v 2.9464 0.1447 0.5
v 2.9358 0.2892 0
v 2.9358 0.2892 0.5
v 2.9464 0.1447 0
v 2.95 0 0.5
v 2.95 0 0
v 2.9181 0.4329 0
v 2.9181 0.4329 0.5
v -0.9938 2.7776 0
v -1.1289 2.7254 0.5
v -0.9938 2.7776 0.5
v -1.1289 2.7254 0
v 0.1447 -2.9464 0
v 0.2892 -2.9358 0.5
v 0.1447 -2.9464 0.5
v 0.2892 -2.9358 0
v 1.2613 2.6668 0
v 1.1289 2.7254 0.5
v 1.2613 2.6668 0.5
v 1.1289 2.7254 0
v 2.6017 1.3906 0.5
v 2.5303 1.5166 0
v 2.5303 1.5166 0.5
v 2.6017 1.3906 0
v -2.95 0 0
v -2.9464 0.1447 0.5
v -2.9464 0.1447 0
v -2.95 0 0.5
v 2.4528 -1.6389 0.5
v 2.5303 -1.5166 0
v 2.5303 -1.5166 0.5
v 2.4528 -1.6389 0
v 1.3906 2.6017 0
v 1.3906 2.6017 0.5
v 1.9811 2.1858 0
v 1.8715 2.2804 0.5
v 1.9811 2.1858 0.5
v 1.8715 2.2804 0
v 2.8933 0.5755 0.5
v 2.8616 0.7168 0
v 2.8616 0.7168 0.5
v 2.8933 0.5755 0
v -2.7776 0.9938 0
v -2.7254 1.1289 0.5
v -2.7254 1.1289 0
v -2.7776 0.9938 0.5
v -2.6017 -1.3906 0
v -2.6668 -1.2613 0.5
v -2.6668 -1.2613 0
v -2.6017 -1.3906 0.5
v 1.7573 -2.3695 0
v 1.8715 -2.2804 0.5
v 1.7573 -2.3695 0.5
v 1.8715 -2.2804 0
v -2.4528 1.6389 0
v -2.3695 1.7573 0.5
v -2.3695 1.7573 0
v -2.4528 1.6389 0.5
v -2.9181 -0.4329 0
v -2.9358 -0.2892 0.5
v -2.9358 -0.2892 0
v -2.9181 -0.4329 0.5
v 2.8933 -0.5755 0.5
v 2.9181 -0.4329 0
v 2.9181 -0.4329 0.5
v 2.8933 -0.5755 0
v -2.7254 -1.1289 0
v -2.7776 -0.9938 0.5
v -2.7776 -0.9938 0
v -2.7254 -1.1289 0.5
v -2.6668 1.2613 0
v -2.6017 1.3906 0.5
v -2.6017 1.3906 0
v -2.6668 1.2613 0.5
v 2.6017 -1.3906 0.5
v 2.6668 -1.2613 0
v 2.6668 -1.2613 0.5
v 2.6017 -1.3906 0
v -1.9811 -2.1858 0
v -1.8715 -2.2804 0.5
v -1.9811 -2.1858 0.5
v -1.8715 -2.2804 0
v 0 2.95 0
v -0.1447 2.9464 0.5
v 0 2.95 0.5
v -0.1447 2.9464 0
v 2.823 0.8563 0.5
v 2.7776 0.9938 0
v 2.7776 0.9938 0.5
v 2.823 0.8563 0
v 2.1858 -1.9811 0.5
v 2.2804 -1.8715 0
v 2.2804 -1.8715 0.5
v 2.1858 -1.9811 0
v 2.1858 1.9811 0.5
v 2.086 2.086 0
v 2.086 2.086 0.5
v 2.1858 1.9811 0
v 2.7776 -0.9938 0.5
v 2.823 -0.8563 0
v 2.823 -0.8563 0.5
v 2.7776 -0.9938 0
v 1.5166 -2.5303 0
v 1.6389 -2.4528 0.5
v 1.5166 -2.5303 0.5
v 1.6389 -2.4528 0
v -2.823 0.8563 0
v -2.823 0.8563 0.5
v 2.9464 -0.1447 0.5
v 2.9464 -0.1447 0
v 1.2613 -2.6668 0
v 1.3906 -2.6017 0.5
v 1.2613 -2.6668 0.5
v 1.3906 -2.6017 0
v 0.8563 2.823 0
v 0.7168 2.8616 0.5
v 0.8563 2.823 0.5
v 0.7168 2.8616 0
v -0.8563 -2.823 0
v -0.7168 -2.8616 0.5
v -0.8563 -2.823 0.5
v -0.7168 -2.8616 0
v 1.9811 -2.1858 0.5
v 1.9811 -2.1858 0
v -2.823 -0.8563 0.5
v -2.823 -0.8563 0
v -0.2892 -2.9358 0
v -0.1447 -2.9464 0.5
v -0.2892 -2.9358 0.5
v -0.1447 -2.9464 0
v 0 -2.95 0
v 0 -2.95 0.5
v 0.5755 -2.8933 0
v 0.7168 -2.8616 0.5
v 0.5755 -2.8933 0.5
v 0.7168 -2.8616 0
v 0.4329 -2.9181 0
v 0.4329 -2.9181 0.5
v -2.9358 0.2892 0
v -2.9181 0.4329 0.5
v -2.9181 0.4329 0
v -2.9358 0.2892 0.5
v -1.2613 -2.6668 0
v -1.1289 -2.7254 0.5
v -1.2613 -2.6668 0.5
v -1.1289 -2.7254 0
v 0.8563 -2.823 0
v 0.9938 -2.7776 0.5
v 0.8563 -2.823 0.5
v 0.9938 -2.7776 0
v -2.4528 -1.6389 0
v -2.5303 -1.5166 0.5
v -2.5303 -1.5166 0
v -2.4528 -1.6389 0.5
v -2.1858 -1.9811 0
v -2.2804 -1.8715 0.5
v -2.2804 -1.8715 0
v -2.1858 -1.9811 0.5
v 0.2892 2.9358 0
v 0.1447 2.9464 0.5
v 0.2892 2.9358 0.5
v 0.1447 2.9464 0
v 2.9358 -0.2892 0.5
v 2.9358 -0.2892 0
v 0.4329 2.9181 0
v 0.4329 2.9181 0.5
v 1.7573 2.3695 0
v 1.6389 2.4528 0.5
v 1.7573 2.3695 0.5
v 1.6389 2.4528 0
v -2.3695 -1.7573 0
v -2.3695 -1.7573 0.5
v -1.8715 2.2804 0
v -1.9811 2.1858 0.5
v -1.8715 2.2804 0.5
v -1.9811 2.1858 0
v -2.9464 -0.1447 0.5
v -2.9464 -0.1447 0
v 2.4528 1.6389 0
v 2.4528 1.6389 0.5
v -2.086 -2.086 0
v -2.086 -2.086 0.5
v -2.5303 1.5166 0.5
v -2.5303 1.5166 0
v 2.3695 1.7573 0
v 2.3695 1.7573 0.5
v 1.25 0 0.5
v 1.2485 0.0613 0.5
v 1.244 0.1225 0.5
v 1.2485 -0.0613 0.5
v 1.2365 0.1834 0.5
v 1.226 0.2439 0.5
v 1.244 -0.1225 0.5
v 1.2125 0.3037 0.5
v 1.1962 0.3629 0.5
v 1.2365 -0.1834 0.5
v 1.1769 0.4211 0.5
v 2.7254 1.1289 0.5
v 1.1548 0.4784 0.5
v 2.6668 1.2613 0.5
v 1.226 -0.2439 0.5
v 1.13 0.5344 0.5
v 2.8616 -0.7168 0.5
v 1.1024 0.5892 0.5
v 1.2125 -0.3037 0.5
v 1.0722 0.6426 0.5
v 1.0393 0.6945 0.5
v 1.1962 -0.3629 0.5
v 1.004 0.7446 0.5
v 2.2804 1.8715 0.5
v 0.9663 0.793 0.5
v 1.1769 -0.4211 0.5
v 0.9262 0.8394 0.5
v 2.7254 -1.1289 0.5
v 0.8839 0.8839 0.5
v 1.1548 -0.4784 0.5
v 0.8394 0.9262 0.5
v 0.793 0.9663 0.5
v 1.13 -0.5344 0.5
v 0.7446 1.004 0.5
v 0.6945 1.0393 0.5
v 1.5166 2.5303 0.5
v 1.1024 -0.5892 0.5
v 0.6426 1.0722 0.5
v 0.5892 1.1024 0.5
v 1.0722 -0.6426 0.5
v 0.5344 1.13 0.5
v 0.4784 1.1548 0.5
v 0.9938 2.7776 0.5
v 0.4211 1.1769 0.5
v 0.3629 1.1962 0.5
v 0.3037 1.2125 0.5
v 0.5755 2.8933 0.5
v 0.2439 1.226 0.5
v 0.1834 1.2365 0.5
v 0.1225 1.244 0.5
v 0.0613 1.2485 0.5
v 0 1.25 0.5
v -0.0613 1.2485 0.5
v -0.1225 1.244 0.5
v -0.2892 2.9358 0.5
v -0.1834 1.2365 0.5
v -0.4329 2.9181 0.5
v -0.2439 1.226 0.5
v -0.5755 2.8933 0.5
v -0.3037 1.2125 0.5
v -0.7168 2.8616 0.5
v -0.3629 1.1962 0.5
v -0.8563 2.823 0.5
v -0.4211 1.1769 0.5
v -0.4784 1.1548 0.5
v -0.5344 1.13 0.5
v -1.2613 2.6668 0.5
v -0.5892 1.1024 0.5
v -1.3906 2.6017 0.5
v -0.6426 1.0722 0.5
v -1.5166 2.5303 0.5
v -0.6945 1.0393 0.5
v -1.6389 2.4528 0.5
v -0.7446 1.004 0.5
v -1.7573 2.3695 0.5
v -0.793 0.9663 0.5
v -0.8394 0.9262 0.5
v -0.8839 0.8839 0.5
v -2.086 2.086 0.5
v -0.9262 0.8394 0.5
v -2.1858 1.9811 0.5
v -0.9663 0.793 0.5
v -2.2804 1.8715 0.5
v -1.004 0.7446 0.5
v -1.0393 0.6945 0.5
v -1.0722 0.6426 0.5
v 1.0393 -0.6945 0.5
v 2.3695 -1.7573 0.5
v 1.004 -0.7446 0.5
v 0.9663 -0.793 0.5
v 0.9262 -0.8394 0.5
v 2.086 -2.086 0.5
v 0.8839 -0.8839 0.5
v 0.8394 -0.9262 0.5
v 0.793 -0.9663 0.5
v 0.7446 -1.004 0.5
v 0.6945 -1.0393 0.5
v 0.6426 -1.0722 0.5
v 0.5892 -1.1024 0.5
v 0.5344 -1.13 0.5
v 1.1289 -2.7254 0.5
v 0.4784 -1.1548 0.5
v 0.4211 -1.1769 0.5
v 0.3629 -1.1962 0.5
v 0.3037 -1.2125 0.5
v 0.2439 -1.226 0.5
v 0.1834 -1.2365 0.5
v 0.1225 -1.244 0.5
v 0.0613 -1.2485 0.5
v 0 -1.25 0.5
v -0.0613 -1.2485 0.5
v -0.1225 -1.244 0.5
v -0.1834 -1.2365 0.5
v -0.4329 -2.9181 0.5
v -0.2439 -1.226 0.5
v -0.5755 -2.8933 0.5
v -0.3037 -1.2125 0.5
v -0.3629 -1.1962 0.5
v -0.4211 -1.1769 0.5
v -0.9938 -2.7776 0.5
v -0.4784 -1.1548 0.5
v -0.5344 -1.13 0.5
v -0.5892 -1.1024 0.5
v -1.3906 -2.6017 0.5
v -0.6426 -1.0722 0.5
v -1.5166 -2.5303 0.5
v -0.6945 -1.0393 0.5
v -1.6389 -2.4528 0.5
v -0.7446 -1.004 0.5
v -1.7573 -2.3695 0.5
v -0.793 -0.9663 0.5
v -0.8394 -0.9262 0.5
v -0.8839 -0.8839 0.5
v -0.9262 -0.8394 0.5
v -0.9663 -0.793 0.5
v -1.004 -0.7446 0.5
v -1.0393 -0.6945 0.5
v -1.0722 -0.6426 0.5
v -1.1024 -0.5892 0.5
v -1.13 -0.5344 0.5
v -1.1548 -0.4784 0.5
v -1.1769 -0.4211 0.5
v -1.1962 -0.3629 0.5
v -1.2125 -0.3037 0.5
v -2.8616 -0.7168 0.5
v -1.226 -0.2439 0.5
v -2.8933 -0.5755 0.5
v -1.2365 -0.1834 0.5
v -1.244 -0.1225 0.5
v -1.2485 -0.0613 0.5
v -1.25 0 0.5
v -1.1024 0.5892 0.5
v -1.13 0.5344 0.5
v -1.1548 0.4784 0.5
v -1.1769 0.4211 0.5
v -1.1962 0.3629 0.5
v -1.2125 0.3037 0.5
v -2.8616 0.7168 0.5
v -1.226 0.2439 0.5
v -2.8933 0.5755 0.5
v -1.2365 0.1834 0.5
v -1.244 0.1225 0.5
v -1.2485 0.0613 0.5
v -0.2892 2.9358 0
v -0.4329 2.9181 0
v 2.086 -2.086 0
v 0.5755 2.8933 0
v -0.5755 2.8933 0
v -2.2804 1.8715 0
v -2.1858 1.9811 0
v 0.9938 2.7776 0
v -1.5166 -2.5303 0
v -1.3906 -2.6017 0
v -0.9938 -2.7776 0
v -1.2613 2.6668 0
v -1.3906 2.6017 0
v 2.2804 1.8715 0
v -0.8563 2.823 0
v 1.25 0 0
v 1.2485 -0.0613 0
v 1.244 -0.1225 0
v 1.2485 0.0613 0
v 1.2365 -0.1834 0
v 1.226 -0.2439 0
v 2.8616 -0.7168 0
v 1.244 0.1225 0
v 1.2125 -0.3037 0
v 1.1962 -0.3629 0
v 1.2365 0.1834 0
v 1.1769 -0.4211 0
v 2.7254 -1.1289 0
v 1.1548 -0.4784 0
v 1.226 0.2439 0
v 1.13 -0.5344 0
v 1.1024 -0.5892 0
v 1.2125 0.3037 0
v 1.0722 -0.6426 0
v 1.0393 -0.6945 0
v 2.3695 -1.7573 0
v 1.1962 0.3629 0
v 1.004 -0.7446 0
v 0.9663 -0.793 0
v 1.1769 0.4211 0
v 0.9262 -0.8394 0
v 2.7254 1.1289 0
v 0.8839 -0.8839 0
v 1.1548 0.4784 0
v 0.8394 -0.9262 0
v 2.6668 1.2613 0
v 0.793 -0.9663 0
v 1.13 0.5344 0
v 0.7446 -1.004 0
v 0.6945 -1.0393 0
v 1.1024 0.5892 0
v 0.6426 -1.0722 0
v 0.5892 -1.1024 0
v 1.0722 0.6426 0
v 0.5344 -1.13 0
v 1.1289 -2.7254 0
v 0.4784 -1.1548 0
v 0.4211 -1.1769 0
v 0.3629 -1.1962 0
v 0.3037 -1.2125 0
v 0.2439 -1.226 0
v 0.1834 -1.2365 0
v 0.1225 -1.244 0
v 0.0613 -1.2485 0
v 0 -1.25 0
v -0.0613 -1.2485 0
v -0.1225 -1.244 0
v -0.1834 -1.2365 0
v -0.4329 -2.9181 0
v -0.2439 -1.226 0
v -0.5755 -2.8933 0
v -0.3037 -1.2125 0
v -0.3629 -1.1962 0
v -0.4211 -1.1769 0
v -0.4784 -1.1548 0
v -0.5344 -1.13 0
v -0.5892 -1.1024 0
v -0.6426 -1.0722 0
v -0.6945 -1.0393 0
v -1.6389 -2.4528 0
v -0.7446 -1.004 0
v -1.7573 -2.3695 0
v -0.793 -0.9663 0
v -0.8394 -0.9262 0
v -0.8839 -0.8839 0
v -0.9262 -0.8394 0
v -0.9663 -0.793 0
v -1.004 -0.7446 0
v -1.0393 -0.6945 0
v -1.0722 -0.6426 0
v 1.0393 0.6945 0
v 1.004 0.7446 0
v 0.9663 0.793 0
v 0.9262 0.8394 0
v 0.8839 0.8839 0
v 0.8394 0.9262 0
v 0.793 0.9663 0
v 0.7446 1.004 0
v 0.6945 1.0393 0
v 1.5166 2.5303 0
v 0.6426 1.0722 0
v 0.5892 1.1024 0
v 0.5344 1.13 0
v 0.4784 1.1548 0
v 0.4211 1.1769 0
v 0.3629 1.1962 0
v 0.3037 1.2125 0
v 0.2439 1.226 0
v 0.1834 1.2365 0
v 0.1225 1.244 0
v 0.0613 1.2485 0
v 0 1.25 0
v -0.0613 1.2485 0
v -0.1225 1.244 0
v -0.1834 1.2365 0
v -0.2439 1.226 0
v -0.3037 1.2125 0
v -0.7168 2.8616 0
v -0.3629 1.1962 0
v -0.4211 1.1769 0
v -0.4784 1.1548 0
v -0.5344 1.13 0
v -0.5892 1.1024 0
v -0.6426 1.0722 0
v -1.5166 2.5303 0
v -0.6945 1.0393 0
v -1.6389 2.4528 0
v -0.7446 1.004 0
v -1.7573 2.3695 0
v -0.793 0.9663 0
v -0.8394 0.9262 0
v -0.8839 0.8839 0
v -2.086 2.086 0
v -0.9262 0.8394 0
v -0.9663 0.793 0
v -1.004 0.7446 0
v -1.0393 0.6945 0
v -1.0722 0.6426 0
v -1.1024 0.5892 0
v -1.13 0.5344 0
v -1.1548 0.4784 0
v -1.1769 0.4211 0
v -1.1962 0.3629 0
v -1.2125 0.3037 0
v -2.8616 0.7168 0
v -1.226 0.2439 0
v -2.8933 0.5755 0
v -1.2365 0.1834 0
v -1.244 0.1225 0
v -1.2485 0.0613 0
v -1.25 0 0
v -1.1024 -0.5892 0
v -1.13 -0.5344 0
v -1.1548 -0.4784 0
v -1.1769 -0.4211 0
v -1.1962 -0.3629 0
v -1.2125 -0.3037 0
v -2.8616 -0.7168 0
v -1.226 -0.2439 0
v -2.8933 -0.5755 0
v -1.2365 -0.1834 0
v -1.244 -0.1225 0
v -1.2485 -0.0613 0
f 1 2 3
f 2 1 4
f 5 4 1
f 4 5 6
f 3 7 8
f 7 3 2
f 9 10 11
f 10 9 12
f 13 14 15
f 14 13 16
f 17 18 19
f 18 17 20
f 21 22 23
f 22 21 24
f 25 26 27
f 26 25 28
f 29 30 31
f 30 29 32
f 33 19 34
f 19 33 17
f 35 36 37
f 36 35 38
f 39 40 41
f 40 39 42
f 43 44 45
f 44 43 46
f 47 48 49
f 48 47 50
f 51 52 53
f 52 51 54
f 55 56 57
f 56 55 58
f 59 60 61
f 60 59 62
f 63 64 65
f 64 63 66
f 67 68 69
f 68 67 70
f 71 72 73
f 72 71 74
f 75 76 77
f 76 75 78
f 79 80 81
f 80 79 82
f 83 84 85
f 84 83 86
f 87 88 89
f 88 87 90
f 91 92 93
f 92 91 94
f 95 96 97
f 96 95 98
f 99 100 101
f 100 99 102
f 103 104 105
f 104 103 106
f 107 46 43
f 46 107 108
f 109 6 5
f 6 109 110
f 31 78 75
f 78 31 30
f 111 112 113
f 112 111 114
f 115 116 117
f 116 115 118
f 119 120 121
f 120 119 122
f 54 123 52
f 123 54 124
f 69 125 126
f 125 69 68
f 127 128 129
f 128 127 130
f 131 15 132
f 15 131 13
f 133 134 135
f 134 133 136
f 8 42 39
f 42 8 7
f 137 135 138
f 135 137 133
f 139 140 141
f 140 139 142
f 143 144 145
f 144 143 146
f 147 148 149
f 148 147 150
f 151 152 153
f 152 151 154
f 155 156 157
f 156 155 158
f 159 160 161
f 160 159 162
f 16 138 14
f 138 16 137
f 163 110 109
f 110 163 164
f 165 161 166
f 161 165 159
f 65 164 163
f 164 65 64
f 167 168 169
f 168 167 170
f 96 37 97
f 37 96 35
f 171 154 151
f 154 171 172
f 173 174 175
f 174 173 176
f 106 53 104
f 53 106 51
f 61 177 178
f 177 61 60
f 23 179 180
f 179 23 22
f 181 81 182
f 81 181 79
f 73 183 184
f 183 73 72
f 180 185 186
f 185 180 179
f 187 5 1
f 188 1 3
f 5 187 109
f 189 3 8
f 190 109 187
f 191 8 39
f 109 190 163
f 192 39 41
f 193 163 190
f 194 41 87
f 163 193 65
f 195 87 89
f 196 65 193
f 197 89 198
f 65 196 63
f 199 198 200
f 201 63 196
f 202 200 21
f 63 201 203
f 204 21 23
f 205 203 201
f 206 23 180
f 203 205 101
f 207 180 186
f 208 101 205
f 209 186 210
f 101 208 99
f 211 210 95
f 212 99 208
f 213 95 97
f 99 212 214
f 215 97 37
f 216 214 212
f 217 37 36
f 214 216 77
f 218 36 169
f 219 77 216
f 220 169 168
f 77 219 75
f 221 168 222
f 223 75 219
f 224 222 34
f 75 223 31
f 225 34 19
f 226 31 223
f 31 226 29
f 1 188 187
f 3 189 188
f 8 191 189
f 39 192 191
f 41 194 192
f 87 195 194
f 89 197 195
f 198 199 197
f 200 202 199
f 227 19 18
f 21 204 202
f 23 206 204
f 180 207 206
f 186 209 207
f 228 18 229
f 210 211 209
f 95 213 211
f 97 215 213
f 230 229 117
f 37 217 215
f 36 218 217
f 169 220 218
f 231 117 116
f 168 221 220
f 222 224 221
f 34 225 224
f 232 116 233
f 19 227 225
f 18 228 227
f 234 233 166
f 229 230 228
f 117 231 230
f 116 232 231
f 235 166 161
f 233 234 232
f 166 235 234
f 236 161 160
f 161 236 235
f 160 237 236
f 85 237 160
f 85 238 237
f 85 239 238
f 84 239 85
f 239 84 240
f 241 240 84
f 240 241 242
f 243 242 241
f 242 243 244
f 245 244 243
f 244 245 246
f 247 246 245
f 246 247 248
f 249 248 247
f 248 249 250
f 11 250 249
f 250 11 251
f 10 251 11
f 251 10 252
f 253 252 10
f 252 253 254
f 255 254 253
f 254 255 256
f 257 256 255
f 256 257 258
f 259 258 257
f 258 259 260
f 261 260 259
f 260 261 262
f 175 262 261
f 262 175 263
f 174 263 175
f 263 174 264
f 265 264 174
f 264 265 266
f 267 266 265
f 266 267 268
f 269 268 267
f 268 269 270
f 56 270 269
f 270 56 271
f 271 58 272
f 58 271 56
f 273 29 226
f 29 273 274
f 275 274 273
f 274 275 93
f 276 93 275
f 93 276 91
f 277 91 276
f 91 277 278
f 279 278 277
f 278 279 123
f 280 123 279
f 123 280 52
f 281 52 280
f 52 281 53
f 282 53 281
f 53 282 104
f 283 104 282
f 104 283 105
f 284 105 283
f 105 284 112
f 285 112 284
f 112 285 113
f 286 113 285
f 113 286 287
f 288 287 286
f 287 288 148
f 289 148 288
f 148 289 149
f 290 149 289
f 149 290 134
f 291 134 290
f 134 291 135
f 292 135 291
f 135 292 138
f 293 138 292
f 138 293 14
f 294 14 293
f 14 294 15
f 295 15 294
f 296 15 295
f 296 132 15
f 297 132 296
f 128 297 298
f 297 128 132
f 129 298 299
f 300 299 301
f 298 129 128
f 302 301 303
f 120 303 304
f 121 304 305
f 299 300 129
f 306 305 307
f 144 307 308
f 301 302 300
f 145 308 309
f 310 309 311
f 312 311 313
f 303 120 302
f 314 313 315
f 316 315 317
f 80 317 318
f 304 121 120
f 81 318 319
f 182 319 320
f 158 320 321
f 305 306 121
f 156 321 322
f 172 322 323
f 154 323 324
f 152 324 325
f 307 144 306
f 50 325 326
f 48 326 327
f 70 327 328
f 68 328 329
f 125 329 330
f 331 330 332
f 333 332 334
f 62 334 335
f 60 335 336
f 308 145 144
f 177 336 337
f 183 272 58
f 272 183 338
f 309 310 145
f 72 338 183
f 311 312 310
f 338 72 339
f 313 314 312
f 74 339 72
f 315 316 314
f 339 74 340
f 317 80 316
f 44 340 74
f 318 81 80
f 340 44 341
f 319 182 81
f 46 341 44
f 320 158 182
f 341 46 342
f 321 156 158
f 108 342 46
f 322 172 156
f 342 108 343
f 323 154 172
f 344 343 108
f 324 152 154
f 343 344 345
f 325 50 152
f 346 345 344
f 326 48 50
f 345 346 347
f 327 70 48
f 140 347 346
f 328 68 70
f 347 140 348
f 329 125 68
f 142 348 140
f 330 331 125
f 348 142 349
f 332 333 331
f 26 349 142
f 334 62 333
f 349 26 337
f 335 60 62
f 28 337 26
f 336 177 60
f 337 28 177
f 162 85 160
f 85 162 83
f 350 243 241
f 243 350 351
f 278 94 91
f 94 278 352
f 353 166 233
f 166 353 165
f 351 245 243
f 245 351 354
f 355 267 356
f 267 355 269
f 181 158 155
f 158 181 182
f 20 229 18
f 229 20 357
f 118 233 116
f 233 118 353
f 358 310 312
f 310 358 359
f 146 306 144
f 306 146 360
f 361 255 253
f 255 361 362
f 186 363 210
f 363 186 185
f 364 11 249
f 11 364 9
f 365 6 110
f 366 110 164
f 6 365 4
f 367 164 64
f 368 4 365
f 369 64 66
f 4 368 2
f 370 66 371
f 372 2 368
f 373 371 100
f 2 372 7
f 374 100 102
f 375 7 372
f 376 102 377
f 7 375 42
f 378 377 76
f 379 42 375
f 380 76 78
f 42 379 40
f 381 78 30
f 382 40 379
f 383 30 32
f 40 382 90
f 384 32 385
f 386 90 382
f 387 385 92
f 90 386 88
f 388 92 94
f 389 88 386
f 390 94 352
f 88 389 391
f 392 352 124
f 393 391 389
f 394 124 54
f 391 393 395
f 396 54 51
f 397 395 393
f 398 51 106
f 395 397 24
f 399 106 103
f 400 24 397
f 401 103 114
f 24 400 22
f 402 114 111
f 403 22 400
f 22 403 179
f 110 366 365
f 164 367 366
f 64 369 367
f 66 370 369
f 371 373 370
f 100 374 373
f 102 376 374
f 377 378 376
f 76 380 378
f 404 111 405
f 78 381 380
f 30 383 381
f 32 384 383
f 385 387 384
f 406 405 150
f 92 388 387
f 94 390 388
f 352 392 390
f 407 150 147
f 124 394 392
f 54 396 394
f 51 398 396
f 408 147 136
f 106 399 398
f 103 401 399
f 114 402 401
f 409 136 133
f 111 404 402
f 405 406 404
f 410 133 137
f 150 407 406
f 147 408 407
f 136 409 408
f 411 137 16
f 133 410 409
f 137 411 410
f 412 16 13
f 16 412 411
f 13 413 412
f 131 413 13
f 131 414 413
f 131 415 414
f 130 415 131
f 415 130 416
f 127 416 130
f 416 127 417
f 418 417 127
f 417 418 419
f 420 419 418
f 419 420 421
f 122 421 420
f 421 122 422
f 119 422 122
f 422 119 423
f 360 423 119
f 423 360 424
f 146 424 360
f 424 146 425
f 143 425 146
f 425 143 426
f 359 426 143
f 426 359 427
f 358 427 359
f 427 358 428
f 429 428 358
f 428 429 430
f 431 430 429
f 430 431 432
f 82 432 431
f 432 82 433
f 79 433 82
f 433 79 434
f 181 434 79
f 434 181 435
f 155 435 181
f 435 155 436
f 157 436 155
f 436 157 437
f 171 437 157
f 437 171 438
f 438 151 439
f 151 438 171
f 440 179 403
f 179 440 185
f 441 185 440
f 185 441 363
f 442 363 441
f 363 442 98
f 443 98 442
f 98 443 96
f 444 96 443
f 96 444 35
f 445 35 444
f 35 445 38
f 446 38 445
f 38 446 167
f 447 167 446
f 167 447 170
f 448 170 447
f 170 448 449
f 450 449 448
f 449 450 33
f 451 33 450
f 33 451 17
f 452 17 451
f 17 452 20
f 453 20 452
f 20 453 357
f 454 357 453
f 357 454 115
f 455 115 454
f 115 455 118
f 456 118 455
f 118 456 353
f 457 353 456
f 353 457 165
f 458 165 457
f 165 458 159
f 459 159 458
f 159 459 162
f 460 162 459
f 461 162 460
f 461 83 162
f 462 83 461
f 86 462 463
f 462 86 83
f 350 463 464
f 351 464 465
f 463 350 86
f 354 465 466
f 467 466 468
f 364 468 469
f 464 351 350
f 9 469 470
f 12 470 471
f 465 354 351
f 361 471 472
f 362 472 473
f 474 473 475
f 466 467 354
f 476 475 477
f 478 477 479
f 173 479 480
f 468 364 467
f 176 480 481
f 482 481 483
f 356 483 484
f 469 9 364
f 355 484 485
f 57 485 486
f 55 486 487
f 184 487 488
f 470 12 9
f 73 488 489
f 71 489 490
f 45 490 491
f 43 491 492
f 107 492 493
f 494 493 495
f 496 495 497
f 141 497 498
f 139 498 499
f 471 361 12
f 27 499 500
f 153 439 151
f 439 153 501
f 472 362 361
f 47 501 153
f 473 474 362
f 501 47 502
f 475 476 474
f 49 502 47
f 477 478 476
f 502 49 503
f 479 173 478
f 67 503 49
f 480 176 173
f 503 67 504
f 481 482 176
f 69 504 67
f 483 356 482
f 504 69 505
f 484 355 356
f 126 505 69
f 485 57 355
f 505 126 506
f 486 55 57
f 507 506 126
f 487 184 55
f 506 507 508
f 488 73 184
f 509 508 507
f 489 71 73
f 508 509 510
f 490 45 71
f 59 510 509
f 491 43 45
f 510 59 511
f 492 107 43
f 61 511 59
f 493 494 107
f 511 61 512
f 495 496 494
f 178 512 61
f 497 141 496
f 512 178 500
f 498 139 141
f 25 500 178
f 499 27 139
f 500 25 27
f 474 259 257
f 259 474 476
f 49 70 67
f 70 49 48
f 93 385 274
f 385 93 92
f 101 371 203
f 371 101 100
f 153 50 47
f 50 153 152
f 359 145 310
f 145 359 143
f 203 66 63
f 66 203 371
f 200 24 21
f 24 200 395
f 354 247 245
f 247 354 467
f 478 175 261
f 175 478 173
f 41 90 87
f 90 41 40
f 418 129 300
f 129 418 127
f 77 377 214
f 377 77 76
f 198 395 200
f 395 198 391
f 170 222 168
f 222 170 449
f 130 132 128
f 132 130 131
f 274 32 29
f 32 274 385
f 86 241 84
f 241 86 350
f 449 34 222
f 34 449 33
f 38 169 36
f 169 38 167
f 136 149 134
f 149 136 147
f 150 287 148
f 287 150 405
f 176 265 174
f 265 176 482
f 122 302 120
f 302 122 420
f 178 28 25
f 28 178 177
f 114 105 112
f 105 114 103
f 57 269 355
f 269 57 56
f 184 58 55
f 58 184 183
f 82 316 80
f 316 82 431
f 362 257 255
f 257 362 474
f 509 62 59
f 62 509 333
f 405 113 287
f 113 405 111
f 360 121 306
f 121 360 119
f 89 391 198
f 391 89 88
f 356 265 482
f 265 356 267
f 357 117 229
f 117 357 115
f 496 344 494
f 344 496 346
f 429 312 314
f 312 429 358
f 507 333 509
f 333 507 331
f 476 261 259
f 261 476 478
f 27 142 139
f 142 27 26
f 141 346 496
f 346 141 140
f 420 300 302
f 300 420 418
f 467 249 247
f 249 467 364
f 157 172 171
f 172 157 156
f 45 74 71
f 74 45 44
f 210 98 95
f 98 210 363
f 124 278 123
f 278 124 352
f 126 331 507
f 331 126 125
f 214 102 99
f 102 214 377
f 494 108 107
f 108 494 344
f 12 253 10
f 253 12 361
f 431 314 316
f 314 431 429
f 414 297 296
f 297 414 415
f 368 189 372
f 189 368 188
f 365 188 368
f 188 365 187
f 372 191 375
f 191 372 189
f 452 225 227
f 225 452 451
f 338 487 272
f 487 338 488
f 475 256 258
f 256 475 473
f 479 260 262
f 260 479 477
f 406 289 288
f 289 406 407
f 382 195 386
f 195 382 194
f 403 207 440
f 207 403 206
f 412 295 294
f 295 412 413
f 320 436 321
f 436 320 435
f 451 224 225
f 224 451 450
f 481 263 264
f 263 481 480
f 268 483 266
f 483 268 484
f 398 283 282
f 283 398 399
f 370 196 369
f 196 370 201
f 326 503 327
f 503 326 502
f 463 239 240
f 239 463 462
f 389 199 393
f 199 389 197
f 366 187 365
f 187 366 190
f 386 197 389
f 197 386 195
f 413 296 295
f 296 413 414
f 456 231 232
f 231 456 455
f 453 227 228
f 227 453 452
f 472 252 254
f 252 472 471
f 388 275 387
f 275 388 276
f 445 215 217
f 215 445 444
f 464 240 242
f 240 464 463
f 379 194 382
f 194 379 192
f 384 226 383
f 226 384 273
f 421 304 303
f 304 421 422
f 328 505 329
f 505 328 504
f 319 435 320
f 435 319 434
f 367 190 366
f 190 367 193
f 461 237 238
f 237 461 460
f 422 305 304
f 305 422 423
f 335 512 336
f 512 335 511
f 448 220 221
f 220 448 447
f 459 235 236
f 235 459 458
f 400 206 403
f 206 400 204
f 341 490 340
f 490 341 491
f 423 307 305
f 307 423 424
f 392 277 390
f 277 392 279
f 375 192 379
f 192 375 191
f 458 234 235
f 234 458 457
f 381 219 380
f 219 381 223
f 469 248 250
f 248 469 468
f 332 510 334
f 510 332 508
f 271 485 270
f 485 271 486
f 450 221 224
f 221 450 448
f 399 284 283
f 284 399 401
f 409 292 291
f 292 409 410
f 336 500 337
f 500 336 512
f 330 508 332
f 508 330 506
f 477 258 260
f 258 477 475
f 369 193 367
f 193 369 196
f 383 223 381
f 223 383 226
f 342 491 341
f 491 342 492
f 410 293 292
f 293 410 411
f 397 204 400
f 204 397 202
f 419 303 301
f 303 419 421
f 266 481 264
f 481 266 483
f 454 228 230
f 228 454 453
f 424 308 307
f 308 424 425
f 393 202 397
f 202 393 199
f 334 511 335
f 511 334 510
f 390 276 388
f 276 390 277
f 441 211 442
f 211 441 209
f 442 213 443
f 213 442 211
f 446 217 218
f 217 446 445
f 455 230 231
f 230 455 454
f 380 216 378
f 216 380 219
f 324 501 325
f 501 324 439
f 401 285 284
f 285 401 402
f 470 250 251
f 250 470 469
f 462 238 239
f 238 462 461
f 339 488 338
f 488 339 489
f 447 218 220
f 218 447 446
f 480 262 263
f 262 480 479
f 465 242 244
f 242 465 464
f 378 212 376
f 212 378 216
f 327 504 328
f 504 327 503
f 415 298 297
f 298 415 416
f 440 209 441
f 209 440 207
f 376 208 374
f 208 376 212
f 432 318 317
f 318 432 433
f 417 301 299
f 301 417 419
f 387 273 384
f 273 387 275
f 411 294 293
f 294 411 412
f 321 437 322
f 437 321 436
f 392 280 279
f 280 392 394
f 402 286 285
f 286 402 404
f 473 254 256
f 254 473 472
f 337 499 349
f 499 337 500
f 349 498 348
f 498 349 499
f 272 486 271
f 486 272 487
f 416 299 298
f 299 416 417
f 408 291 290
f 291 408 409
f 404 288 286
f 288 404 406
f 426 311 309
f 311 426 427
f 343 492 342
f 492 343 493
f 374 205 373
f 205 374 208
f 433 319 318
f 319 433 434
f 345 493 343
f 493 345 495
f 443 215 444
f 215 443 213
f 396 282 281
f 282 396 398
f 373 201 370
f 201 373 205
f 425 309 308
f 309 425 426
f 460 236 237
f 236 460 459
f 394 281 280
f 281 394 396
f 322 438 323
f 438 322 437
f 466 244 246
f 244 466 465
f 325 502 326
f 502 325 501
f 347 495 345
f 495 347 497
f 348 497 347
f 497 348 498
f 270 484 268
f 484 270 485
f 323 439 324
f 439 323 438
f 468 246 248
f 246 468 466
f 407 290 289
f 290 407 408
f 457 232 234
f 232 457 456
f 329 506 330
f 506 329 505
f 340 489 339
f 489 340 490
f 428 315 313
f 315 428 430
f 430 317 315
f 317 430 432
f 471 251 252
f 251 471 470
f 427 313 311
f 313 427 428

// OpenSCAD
$fn = 128;

inner_d = 2.5;
outer_d = 5.9;
thickness = 0.5;

difference() {
  cylinder(h = thickness, d = outer_d);
  cylinder(h = thickness + 0.2, d = inner_d);
}
